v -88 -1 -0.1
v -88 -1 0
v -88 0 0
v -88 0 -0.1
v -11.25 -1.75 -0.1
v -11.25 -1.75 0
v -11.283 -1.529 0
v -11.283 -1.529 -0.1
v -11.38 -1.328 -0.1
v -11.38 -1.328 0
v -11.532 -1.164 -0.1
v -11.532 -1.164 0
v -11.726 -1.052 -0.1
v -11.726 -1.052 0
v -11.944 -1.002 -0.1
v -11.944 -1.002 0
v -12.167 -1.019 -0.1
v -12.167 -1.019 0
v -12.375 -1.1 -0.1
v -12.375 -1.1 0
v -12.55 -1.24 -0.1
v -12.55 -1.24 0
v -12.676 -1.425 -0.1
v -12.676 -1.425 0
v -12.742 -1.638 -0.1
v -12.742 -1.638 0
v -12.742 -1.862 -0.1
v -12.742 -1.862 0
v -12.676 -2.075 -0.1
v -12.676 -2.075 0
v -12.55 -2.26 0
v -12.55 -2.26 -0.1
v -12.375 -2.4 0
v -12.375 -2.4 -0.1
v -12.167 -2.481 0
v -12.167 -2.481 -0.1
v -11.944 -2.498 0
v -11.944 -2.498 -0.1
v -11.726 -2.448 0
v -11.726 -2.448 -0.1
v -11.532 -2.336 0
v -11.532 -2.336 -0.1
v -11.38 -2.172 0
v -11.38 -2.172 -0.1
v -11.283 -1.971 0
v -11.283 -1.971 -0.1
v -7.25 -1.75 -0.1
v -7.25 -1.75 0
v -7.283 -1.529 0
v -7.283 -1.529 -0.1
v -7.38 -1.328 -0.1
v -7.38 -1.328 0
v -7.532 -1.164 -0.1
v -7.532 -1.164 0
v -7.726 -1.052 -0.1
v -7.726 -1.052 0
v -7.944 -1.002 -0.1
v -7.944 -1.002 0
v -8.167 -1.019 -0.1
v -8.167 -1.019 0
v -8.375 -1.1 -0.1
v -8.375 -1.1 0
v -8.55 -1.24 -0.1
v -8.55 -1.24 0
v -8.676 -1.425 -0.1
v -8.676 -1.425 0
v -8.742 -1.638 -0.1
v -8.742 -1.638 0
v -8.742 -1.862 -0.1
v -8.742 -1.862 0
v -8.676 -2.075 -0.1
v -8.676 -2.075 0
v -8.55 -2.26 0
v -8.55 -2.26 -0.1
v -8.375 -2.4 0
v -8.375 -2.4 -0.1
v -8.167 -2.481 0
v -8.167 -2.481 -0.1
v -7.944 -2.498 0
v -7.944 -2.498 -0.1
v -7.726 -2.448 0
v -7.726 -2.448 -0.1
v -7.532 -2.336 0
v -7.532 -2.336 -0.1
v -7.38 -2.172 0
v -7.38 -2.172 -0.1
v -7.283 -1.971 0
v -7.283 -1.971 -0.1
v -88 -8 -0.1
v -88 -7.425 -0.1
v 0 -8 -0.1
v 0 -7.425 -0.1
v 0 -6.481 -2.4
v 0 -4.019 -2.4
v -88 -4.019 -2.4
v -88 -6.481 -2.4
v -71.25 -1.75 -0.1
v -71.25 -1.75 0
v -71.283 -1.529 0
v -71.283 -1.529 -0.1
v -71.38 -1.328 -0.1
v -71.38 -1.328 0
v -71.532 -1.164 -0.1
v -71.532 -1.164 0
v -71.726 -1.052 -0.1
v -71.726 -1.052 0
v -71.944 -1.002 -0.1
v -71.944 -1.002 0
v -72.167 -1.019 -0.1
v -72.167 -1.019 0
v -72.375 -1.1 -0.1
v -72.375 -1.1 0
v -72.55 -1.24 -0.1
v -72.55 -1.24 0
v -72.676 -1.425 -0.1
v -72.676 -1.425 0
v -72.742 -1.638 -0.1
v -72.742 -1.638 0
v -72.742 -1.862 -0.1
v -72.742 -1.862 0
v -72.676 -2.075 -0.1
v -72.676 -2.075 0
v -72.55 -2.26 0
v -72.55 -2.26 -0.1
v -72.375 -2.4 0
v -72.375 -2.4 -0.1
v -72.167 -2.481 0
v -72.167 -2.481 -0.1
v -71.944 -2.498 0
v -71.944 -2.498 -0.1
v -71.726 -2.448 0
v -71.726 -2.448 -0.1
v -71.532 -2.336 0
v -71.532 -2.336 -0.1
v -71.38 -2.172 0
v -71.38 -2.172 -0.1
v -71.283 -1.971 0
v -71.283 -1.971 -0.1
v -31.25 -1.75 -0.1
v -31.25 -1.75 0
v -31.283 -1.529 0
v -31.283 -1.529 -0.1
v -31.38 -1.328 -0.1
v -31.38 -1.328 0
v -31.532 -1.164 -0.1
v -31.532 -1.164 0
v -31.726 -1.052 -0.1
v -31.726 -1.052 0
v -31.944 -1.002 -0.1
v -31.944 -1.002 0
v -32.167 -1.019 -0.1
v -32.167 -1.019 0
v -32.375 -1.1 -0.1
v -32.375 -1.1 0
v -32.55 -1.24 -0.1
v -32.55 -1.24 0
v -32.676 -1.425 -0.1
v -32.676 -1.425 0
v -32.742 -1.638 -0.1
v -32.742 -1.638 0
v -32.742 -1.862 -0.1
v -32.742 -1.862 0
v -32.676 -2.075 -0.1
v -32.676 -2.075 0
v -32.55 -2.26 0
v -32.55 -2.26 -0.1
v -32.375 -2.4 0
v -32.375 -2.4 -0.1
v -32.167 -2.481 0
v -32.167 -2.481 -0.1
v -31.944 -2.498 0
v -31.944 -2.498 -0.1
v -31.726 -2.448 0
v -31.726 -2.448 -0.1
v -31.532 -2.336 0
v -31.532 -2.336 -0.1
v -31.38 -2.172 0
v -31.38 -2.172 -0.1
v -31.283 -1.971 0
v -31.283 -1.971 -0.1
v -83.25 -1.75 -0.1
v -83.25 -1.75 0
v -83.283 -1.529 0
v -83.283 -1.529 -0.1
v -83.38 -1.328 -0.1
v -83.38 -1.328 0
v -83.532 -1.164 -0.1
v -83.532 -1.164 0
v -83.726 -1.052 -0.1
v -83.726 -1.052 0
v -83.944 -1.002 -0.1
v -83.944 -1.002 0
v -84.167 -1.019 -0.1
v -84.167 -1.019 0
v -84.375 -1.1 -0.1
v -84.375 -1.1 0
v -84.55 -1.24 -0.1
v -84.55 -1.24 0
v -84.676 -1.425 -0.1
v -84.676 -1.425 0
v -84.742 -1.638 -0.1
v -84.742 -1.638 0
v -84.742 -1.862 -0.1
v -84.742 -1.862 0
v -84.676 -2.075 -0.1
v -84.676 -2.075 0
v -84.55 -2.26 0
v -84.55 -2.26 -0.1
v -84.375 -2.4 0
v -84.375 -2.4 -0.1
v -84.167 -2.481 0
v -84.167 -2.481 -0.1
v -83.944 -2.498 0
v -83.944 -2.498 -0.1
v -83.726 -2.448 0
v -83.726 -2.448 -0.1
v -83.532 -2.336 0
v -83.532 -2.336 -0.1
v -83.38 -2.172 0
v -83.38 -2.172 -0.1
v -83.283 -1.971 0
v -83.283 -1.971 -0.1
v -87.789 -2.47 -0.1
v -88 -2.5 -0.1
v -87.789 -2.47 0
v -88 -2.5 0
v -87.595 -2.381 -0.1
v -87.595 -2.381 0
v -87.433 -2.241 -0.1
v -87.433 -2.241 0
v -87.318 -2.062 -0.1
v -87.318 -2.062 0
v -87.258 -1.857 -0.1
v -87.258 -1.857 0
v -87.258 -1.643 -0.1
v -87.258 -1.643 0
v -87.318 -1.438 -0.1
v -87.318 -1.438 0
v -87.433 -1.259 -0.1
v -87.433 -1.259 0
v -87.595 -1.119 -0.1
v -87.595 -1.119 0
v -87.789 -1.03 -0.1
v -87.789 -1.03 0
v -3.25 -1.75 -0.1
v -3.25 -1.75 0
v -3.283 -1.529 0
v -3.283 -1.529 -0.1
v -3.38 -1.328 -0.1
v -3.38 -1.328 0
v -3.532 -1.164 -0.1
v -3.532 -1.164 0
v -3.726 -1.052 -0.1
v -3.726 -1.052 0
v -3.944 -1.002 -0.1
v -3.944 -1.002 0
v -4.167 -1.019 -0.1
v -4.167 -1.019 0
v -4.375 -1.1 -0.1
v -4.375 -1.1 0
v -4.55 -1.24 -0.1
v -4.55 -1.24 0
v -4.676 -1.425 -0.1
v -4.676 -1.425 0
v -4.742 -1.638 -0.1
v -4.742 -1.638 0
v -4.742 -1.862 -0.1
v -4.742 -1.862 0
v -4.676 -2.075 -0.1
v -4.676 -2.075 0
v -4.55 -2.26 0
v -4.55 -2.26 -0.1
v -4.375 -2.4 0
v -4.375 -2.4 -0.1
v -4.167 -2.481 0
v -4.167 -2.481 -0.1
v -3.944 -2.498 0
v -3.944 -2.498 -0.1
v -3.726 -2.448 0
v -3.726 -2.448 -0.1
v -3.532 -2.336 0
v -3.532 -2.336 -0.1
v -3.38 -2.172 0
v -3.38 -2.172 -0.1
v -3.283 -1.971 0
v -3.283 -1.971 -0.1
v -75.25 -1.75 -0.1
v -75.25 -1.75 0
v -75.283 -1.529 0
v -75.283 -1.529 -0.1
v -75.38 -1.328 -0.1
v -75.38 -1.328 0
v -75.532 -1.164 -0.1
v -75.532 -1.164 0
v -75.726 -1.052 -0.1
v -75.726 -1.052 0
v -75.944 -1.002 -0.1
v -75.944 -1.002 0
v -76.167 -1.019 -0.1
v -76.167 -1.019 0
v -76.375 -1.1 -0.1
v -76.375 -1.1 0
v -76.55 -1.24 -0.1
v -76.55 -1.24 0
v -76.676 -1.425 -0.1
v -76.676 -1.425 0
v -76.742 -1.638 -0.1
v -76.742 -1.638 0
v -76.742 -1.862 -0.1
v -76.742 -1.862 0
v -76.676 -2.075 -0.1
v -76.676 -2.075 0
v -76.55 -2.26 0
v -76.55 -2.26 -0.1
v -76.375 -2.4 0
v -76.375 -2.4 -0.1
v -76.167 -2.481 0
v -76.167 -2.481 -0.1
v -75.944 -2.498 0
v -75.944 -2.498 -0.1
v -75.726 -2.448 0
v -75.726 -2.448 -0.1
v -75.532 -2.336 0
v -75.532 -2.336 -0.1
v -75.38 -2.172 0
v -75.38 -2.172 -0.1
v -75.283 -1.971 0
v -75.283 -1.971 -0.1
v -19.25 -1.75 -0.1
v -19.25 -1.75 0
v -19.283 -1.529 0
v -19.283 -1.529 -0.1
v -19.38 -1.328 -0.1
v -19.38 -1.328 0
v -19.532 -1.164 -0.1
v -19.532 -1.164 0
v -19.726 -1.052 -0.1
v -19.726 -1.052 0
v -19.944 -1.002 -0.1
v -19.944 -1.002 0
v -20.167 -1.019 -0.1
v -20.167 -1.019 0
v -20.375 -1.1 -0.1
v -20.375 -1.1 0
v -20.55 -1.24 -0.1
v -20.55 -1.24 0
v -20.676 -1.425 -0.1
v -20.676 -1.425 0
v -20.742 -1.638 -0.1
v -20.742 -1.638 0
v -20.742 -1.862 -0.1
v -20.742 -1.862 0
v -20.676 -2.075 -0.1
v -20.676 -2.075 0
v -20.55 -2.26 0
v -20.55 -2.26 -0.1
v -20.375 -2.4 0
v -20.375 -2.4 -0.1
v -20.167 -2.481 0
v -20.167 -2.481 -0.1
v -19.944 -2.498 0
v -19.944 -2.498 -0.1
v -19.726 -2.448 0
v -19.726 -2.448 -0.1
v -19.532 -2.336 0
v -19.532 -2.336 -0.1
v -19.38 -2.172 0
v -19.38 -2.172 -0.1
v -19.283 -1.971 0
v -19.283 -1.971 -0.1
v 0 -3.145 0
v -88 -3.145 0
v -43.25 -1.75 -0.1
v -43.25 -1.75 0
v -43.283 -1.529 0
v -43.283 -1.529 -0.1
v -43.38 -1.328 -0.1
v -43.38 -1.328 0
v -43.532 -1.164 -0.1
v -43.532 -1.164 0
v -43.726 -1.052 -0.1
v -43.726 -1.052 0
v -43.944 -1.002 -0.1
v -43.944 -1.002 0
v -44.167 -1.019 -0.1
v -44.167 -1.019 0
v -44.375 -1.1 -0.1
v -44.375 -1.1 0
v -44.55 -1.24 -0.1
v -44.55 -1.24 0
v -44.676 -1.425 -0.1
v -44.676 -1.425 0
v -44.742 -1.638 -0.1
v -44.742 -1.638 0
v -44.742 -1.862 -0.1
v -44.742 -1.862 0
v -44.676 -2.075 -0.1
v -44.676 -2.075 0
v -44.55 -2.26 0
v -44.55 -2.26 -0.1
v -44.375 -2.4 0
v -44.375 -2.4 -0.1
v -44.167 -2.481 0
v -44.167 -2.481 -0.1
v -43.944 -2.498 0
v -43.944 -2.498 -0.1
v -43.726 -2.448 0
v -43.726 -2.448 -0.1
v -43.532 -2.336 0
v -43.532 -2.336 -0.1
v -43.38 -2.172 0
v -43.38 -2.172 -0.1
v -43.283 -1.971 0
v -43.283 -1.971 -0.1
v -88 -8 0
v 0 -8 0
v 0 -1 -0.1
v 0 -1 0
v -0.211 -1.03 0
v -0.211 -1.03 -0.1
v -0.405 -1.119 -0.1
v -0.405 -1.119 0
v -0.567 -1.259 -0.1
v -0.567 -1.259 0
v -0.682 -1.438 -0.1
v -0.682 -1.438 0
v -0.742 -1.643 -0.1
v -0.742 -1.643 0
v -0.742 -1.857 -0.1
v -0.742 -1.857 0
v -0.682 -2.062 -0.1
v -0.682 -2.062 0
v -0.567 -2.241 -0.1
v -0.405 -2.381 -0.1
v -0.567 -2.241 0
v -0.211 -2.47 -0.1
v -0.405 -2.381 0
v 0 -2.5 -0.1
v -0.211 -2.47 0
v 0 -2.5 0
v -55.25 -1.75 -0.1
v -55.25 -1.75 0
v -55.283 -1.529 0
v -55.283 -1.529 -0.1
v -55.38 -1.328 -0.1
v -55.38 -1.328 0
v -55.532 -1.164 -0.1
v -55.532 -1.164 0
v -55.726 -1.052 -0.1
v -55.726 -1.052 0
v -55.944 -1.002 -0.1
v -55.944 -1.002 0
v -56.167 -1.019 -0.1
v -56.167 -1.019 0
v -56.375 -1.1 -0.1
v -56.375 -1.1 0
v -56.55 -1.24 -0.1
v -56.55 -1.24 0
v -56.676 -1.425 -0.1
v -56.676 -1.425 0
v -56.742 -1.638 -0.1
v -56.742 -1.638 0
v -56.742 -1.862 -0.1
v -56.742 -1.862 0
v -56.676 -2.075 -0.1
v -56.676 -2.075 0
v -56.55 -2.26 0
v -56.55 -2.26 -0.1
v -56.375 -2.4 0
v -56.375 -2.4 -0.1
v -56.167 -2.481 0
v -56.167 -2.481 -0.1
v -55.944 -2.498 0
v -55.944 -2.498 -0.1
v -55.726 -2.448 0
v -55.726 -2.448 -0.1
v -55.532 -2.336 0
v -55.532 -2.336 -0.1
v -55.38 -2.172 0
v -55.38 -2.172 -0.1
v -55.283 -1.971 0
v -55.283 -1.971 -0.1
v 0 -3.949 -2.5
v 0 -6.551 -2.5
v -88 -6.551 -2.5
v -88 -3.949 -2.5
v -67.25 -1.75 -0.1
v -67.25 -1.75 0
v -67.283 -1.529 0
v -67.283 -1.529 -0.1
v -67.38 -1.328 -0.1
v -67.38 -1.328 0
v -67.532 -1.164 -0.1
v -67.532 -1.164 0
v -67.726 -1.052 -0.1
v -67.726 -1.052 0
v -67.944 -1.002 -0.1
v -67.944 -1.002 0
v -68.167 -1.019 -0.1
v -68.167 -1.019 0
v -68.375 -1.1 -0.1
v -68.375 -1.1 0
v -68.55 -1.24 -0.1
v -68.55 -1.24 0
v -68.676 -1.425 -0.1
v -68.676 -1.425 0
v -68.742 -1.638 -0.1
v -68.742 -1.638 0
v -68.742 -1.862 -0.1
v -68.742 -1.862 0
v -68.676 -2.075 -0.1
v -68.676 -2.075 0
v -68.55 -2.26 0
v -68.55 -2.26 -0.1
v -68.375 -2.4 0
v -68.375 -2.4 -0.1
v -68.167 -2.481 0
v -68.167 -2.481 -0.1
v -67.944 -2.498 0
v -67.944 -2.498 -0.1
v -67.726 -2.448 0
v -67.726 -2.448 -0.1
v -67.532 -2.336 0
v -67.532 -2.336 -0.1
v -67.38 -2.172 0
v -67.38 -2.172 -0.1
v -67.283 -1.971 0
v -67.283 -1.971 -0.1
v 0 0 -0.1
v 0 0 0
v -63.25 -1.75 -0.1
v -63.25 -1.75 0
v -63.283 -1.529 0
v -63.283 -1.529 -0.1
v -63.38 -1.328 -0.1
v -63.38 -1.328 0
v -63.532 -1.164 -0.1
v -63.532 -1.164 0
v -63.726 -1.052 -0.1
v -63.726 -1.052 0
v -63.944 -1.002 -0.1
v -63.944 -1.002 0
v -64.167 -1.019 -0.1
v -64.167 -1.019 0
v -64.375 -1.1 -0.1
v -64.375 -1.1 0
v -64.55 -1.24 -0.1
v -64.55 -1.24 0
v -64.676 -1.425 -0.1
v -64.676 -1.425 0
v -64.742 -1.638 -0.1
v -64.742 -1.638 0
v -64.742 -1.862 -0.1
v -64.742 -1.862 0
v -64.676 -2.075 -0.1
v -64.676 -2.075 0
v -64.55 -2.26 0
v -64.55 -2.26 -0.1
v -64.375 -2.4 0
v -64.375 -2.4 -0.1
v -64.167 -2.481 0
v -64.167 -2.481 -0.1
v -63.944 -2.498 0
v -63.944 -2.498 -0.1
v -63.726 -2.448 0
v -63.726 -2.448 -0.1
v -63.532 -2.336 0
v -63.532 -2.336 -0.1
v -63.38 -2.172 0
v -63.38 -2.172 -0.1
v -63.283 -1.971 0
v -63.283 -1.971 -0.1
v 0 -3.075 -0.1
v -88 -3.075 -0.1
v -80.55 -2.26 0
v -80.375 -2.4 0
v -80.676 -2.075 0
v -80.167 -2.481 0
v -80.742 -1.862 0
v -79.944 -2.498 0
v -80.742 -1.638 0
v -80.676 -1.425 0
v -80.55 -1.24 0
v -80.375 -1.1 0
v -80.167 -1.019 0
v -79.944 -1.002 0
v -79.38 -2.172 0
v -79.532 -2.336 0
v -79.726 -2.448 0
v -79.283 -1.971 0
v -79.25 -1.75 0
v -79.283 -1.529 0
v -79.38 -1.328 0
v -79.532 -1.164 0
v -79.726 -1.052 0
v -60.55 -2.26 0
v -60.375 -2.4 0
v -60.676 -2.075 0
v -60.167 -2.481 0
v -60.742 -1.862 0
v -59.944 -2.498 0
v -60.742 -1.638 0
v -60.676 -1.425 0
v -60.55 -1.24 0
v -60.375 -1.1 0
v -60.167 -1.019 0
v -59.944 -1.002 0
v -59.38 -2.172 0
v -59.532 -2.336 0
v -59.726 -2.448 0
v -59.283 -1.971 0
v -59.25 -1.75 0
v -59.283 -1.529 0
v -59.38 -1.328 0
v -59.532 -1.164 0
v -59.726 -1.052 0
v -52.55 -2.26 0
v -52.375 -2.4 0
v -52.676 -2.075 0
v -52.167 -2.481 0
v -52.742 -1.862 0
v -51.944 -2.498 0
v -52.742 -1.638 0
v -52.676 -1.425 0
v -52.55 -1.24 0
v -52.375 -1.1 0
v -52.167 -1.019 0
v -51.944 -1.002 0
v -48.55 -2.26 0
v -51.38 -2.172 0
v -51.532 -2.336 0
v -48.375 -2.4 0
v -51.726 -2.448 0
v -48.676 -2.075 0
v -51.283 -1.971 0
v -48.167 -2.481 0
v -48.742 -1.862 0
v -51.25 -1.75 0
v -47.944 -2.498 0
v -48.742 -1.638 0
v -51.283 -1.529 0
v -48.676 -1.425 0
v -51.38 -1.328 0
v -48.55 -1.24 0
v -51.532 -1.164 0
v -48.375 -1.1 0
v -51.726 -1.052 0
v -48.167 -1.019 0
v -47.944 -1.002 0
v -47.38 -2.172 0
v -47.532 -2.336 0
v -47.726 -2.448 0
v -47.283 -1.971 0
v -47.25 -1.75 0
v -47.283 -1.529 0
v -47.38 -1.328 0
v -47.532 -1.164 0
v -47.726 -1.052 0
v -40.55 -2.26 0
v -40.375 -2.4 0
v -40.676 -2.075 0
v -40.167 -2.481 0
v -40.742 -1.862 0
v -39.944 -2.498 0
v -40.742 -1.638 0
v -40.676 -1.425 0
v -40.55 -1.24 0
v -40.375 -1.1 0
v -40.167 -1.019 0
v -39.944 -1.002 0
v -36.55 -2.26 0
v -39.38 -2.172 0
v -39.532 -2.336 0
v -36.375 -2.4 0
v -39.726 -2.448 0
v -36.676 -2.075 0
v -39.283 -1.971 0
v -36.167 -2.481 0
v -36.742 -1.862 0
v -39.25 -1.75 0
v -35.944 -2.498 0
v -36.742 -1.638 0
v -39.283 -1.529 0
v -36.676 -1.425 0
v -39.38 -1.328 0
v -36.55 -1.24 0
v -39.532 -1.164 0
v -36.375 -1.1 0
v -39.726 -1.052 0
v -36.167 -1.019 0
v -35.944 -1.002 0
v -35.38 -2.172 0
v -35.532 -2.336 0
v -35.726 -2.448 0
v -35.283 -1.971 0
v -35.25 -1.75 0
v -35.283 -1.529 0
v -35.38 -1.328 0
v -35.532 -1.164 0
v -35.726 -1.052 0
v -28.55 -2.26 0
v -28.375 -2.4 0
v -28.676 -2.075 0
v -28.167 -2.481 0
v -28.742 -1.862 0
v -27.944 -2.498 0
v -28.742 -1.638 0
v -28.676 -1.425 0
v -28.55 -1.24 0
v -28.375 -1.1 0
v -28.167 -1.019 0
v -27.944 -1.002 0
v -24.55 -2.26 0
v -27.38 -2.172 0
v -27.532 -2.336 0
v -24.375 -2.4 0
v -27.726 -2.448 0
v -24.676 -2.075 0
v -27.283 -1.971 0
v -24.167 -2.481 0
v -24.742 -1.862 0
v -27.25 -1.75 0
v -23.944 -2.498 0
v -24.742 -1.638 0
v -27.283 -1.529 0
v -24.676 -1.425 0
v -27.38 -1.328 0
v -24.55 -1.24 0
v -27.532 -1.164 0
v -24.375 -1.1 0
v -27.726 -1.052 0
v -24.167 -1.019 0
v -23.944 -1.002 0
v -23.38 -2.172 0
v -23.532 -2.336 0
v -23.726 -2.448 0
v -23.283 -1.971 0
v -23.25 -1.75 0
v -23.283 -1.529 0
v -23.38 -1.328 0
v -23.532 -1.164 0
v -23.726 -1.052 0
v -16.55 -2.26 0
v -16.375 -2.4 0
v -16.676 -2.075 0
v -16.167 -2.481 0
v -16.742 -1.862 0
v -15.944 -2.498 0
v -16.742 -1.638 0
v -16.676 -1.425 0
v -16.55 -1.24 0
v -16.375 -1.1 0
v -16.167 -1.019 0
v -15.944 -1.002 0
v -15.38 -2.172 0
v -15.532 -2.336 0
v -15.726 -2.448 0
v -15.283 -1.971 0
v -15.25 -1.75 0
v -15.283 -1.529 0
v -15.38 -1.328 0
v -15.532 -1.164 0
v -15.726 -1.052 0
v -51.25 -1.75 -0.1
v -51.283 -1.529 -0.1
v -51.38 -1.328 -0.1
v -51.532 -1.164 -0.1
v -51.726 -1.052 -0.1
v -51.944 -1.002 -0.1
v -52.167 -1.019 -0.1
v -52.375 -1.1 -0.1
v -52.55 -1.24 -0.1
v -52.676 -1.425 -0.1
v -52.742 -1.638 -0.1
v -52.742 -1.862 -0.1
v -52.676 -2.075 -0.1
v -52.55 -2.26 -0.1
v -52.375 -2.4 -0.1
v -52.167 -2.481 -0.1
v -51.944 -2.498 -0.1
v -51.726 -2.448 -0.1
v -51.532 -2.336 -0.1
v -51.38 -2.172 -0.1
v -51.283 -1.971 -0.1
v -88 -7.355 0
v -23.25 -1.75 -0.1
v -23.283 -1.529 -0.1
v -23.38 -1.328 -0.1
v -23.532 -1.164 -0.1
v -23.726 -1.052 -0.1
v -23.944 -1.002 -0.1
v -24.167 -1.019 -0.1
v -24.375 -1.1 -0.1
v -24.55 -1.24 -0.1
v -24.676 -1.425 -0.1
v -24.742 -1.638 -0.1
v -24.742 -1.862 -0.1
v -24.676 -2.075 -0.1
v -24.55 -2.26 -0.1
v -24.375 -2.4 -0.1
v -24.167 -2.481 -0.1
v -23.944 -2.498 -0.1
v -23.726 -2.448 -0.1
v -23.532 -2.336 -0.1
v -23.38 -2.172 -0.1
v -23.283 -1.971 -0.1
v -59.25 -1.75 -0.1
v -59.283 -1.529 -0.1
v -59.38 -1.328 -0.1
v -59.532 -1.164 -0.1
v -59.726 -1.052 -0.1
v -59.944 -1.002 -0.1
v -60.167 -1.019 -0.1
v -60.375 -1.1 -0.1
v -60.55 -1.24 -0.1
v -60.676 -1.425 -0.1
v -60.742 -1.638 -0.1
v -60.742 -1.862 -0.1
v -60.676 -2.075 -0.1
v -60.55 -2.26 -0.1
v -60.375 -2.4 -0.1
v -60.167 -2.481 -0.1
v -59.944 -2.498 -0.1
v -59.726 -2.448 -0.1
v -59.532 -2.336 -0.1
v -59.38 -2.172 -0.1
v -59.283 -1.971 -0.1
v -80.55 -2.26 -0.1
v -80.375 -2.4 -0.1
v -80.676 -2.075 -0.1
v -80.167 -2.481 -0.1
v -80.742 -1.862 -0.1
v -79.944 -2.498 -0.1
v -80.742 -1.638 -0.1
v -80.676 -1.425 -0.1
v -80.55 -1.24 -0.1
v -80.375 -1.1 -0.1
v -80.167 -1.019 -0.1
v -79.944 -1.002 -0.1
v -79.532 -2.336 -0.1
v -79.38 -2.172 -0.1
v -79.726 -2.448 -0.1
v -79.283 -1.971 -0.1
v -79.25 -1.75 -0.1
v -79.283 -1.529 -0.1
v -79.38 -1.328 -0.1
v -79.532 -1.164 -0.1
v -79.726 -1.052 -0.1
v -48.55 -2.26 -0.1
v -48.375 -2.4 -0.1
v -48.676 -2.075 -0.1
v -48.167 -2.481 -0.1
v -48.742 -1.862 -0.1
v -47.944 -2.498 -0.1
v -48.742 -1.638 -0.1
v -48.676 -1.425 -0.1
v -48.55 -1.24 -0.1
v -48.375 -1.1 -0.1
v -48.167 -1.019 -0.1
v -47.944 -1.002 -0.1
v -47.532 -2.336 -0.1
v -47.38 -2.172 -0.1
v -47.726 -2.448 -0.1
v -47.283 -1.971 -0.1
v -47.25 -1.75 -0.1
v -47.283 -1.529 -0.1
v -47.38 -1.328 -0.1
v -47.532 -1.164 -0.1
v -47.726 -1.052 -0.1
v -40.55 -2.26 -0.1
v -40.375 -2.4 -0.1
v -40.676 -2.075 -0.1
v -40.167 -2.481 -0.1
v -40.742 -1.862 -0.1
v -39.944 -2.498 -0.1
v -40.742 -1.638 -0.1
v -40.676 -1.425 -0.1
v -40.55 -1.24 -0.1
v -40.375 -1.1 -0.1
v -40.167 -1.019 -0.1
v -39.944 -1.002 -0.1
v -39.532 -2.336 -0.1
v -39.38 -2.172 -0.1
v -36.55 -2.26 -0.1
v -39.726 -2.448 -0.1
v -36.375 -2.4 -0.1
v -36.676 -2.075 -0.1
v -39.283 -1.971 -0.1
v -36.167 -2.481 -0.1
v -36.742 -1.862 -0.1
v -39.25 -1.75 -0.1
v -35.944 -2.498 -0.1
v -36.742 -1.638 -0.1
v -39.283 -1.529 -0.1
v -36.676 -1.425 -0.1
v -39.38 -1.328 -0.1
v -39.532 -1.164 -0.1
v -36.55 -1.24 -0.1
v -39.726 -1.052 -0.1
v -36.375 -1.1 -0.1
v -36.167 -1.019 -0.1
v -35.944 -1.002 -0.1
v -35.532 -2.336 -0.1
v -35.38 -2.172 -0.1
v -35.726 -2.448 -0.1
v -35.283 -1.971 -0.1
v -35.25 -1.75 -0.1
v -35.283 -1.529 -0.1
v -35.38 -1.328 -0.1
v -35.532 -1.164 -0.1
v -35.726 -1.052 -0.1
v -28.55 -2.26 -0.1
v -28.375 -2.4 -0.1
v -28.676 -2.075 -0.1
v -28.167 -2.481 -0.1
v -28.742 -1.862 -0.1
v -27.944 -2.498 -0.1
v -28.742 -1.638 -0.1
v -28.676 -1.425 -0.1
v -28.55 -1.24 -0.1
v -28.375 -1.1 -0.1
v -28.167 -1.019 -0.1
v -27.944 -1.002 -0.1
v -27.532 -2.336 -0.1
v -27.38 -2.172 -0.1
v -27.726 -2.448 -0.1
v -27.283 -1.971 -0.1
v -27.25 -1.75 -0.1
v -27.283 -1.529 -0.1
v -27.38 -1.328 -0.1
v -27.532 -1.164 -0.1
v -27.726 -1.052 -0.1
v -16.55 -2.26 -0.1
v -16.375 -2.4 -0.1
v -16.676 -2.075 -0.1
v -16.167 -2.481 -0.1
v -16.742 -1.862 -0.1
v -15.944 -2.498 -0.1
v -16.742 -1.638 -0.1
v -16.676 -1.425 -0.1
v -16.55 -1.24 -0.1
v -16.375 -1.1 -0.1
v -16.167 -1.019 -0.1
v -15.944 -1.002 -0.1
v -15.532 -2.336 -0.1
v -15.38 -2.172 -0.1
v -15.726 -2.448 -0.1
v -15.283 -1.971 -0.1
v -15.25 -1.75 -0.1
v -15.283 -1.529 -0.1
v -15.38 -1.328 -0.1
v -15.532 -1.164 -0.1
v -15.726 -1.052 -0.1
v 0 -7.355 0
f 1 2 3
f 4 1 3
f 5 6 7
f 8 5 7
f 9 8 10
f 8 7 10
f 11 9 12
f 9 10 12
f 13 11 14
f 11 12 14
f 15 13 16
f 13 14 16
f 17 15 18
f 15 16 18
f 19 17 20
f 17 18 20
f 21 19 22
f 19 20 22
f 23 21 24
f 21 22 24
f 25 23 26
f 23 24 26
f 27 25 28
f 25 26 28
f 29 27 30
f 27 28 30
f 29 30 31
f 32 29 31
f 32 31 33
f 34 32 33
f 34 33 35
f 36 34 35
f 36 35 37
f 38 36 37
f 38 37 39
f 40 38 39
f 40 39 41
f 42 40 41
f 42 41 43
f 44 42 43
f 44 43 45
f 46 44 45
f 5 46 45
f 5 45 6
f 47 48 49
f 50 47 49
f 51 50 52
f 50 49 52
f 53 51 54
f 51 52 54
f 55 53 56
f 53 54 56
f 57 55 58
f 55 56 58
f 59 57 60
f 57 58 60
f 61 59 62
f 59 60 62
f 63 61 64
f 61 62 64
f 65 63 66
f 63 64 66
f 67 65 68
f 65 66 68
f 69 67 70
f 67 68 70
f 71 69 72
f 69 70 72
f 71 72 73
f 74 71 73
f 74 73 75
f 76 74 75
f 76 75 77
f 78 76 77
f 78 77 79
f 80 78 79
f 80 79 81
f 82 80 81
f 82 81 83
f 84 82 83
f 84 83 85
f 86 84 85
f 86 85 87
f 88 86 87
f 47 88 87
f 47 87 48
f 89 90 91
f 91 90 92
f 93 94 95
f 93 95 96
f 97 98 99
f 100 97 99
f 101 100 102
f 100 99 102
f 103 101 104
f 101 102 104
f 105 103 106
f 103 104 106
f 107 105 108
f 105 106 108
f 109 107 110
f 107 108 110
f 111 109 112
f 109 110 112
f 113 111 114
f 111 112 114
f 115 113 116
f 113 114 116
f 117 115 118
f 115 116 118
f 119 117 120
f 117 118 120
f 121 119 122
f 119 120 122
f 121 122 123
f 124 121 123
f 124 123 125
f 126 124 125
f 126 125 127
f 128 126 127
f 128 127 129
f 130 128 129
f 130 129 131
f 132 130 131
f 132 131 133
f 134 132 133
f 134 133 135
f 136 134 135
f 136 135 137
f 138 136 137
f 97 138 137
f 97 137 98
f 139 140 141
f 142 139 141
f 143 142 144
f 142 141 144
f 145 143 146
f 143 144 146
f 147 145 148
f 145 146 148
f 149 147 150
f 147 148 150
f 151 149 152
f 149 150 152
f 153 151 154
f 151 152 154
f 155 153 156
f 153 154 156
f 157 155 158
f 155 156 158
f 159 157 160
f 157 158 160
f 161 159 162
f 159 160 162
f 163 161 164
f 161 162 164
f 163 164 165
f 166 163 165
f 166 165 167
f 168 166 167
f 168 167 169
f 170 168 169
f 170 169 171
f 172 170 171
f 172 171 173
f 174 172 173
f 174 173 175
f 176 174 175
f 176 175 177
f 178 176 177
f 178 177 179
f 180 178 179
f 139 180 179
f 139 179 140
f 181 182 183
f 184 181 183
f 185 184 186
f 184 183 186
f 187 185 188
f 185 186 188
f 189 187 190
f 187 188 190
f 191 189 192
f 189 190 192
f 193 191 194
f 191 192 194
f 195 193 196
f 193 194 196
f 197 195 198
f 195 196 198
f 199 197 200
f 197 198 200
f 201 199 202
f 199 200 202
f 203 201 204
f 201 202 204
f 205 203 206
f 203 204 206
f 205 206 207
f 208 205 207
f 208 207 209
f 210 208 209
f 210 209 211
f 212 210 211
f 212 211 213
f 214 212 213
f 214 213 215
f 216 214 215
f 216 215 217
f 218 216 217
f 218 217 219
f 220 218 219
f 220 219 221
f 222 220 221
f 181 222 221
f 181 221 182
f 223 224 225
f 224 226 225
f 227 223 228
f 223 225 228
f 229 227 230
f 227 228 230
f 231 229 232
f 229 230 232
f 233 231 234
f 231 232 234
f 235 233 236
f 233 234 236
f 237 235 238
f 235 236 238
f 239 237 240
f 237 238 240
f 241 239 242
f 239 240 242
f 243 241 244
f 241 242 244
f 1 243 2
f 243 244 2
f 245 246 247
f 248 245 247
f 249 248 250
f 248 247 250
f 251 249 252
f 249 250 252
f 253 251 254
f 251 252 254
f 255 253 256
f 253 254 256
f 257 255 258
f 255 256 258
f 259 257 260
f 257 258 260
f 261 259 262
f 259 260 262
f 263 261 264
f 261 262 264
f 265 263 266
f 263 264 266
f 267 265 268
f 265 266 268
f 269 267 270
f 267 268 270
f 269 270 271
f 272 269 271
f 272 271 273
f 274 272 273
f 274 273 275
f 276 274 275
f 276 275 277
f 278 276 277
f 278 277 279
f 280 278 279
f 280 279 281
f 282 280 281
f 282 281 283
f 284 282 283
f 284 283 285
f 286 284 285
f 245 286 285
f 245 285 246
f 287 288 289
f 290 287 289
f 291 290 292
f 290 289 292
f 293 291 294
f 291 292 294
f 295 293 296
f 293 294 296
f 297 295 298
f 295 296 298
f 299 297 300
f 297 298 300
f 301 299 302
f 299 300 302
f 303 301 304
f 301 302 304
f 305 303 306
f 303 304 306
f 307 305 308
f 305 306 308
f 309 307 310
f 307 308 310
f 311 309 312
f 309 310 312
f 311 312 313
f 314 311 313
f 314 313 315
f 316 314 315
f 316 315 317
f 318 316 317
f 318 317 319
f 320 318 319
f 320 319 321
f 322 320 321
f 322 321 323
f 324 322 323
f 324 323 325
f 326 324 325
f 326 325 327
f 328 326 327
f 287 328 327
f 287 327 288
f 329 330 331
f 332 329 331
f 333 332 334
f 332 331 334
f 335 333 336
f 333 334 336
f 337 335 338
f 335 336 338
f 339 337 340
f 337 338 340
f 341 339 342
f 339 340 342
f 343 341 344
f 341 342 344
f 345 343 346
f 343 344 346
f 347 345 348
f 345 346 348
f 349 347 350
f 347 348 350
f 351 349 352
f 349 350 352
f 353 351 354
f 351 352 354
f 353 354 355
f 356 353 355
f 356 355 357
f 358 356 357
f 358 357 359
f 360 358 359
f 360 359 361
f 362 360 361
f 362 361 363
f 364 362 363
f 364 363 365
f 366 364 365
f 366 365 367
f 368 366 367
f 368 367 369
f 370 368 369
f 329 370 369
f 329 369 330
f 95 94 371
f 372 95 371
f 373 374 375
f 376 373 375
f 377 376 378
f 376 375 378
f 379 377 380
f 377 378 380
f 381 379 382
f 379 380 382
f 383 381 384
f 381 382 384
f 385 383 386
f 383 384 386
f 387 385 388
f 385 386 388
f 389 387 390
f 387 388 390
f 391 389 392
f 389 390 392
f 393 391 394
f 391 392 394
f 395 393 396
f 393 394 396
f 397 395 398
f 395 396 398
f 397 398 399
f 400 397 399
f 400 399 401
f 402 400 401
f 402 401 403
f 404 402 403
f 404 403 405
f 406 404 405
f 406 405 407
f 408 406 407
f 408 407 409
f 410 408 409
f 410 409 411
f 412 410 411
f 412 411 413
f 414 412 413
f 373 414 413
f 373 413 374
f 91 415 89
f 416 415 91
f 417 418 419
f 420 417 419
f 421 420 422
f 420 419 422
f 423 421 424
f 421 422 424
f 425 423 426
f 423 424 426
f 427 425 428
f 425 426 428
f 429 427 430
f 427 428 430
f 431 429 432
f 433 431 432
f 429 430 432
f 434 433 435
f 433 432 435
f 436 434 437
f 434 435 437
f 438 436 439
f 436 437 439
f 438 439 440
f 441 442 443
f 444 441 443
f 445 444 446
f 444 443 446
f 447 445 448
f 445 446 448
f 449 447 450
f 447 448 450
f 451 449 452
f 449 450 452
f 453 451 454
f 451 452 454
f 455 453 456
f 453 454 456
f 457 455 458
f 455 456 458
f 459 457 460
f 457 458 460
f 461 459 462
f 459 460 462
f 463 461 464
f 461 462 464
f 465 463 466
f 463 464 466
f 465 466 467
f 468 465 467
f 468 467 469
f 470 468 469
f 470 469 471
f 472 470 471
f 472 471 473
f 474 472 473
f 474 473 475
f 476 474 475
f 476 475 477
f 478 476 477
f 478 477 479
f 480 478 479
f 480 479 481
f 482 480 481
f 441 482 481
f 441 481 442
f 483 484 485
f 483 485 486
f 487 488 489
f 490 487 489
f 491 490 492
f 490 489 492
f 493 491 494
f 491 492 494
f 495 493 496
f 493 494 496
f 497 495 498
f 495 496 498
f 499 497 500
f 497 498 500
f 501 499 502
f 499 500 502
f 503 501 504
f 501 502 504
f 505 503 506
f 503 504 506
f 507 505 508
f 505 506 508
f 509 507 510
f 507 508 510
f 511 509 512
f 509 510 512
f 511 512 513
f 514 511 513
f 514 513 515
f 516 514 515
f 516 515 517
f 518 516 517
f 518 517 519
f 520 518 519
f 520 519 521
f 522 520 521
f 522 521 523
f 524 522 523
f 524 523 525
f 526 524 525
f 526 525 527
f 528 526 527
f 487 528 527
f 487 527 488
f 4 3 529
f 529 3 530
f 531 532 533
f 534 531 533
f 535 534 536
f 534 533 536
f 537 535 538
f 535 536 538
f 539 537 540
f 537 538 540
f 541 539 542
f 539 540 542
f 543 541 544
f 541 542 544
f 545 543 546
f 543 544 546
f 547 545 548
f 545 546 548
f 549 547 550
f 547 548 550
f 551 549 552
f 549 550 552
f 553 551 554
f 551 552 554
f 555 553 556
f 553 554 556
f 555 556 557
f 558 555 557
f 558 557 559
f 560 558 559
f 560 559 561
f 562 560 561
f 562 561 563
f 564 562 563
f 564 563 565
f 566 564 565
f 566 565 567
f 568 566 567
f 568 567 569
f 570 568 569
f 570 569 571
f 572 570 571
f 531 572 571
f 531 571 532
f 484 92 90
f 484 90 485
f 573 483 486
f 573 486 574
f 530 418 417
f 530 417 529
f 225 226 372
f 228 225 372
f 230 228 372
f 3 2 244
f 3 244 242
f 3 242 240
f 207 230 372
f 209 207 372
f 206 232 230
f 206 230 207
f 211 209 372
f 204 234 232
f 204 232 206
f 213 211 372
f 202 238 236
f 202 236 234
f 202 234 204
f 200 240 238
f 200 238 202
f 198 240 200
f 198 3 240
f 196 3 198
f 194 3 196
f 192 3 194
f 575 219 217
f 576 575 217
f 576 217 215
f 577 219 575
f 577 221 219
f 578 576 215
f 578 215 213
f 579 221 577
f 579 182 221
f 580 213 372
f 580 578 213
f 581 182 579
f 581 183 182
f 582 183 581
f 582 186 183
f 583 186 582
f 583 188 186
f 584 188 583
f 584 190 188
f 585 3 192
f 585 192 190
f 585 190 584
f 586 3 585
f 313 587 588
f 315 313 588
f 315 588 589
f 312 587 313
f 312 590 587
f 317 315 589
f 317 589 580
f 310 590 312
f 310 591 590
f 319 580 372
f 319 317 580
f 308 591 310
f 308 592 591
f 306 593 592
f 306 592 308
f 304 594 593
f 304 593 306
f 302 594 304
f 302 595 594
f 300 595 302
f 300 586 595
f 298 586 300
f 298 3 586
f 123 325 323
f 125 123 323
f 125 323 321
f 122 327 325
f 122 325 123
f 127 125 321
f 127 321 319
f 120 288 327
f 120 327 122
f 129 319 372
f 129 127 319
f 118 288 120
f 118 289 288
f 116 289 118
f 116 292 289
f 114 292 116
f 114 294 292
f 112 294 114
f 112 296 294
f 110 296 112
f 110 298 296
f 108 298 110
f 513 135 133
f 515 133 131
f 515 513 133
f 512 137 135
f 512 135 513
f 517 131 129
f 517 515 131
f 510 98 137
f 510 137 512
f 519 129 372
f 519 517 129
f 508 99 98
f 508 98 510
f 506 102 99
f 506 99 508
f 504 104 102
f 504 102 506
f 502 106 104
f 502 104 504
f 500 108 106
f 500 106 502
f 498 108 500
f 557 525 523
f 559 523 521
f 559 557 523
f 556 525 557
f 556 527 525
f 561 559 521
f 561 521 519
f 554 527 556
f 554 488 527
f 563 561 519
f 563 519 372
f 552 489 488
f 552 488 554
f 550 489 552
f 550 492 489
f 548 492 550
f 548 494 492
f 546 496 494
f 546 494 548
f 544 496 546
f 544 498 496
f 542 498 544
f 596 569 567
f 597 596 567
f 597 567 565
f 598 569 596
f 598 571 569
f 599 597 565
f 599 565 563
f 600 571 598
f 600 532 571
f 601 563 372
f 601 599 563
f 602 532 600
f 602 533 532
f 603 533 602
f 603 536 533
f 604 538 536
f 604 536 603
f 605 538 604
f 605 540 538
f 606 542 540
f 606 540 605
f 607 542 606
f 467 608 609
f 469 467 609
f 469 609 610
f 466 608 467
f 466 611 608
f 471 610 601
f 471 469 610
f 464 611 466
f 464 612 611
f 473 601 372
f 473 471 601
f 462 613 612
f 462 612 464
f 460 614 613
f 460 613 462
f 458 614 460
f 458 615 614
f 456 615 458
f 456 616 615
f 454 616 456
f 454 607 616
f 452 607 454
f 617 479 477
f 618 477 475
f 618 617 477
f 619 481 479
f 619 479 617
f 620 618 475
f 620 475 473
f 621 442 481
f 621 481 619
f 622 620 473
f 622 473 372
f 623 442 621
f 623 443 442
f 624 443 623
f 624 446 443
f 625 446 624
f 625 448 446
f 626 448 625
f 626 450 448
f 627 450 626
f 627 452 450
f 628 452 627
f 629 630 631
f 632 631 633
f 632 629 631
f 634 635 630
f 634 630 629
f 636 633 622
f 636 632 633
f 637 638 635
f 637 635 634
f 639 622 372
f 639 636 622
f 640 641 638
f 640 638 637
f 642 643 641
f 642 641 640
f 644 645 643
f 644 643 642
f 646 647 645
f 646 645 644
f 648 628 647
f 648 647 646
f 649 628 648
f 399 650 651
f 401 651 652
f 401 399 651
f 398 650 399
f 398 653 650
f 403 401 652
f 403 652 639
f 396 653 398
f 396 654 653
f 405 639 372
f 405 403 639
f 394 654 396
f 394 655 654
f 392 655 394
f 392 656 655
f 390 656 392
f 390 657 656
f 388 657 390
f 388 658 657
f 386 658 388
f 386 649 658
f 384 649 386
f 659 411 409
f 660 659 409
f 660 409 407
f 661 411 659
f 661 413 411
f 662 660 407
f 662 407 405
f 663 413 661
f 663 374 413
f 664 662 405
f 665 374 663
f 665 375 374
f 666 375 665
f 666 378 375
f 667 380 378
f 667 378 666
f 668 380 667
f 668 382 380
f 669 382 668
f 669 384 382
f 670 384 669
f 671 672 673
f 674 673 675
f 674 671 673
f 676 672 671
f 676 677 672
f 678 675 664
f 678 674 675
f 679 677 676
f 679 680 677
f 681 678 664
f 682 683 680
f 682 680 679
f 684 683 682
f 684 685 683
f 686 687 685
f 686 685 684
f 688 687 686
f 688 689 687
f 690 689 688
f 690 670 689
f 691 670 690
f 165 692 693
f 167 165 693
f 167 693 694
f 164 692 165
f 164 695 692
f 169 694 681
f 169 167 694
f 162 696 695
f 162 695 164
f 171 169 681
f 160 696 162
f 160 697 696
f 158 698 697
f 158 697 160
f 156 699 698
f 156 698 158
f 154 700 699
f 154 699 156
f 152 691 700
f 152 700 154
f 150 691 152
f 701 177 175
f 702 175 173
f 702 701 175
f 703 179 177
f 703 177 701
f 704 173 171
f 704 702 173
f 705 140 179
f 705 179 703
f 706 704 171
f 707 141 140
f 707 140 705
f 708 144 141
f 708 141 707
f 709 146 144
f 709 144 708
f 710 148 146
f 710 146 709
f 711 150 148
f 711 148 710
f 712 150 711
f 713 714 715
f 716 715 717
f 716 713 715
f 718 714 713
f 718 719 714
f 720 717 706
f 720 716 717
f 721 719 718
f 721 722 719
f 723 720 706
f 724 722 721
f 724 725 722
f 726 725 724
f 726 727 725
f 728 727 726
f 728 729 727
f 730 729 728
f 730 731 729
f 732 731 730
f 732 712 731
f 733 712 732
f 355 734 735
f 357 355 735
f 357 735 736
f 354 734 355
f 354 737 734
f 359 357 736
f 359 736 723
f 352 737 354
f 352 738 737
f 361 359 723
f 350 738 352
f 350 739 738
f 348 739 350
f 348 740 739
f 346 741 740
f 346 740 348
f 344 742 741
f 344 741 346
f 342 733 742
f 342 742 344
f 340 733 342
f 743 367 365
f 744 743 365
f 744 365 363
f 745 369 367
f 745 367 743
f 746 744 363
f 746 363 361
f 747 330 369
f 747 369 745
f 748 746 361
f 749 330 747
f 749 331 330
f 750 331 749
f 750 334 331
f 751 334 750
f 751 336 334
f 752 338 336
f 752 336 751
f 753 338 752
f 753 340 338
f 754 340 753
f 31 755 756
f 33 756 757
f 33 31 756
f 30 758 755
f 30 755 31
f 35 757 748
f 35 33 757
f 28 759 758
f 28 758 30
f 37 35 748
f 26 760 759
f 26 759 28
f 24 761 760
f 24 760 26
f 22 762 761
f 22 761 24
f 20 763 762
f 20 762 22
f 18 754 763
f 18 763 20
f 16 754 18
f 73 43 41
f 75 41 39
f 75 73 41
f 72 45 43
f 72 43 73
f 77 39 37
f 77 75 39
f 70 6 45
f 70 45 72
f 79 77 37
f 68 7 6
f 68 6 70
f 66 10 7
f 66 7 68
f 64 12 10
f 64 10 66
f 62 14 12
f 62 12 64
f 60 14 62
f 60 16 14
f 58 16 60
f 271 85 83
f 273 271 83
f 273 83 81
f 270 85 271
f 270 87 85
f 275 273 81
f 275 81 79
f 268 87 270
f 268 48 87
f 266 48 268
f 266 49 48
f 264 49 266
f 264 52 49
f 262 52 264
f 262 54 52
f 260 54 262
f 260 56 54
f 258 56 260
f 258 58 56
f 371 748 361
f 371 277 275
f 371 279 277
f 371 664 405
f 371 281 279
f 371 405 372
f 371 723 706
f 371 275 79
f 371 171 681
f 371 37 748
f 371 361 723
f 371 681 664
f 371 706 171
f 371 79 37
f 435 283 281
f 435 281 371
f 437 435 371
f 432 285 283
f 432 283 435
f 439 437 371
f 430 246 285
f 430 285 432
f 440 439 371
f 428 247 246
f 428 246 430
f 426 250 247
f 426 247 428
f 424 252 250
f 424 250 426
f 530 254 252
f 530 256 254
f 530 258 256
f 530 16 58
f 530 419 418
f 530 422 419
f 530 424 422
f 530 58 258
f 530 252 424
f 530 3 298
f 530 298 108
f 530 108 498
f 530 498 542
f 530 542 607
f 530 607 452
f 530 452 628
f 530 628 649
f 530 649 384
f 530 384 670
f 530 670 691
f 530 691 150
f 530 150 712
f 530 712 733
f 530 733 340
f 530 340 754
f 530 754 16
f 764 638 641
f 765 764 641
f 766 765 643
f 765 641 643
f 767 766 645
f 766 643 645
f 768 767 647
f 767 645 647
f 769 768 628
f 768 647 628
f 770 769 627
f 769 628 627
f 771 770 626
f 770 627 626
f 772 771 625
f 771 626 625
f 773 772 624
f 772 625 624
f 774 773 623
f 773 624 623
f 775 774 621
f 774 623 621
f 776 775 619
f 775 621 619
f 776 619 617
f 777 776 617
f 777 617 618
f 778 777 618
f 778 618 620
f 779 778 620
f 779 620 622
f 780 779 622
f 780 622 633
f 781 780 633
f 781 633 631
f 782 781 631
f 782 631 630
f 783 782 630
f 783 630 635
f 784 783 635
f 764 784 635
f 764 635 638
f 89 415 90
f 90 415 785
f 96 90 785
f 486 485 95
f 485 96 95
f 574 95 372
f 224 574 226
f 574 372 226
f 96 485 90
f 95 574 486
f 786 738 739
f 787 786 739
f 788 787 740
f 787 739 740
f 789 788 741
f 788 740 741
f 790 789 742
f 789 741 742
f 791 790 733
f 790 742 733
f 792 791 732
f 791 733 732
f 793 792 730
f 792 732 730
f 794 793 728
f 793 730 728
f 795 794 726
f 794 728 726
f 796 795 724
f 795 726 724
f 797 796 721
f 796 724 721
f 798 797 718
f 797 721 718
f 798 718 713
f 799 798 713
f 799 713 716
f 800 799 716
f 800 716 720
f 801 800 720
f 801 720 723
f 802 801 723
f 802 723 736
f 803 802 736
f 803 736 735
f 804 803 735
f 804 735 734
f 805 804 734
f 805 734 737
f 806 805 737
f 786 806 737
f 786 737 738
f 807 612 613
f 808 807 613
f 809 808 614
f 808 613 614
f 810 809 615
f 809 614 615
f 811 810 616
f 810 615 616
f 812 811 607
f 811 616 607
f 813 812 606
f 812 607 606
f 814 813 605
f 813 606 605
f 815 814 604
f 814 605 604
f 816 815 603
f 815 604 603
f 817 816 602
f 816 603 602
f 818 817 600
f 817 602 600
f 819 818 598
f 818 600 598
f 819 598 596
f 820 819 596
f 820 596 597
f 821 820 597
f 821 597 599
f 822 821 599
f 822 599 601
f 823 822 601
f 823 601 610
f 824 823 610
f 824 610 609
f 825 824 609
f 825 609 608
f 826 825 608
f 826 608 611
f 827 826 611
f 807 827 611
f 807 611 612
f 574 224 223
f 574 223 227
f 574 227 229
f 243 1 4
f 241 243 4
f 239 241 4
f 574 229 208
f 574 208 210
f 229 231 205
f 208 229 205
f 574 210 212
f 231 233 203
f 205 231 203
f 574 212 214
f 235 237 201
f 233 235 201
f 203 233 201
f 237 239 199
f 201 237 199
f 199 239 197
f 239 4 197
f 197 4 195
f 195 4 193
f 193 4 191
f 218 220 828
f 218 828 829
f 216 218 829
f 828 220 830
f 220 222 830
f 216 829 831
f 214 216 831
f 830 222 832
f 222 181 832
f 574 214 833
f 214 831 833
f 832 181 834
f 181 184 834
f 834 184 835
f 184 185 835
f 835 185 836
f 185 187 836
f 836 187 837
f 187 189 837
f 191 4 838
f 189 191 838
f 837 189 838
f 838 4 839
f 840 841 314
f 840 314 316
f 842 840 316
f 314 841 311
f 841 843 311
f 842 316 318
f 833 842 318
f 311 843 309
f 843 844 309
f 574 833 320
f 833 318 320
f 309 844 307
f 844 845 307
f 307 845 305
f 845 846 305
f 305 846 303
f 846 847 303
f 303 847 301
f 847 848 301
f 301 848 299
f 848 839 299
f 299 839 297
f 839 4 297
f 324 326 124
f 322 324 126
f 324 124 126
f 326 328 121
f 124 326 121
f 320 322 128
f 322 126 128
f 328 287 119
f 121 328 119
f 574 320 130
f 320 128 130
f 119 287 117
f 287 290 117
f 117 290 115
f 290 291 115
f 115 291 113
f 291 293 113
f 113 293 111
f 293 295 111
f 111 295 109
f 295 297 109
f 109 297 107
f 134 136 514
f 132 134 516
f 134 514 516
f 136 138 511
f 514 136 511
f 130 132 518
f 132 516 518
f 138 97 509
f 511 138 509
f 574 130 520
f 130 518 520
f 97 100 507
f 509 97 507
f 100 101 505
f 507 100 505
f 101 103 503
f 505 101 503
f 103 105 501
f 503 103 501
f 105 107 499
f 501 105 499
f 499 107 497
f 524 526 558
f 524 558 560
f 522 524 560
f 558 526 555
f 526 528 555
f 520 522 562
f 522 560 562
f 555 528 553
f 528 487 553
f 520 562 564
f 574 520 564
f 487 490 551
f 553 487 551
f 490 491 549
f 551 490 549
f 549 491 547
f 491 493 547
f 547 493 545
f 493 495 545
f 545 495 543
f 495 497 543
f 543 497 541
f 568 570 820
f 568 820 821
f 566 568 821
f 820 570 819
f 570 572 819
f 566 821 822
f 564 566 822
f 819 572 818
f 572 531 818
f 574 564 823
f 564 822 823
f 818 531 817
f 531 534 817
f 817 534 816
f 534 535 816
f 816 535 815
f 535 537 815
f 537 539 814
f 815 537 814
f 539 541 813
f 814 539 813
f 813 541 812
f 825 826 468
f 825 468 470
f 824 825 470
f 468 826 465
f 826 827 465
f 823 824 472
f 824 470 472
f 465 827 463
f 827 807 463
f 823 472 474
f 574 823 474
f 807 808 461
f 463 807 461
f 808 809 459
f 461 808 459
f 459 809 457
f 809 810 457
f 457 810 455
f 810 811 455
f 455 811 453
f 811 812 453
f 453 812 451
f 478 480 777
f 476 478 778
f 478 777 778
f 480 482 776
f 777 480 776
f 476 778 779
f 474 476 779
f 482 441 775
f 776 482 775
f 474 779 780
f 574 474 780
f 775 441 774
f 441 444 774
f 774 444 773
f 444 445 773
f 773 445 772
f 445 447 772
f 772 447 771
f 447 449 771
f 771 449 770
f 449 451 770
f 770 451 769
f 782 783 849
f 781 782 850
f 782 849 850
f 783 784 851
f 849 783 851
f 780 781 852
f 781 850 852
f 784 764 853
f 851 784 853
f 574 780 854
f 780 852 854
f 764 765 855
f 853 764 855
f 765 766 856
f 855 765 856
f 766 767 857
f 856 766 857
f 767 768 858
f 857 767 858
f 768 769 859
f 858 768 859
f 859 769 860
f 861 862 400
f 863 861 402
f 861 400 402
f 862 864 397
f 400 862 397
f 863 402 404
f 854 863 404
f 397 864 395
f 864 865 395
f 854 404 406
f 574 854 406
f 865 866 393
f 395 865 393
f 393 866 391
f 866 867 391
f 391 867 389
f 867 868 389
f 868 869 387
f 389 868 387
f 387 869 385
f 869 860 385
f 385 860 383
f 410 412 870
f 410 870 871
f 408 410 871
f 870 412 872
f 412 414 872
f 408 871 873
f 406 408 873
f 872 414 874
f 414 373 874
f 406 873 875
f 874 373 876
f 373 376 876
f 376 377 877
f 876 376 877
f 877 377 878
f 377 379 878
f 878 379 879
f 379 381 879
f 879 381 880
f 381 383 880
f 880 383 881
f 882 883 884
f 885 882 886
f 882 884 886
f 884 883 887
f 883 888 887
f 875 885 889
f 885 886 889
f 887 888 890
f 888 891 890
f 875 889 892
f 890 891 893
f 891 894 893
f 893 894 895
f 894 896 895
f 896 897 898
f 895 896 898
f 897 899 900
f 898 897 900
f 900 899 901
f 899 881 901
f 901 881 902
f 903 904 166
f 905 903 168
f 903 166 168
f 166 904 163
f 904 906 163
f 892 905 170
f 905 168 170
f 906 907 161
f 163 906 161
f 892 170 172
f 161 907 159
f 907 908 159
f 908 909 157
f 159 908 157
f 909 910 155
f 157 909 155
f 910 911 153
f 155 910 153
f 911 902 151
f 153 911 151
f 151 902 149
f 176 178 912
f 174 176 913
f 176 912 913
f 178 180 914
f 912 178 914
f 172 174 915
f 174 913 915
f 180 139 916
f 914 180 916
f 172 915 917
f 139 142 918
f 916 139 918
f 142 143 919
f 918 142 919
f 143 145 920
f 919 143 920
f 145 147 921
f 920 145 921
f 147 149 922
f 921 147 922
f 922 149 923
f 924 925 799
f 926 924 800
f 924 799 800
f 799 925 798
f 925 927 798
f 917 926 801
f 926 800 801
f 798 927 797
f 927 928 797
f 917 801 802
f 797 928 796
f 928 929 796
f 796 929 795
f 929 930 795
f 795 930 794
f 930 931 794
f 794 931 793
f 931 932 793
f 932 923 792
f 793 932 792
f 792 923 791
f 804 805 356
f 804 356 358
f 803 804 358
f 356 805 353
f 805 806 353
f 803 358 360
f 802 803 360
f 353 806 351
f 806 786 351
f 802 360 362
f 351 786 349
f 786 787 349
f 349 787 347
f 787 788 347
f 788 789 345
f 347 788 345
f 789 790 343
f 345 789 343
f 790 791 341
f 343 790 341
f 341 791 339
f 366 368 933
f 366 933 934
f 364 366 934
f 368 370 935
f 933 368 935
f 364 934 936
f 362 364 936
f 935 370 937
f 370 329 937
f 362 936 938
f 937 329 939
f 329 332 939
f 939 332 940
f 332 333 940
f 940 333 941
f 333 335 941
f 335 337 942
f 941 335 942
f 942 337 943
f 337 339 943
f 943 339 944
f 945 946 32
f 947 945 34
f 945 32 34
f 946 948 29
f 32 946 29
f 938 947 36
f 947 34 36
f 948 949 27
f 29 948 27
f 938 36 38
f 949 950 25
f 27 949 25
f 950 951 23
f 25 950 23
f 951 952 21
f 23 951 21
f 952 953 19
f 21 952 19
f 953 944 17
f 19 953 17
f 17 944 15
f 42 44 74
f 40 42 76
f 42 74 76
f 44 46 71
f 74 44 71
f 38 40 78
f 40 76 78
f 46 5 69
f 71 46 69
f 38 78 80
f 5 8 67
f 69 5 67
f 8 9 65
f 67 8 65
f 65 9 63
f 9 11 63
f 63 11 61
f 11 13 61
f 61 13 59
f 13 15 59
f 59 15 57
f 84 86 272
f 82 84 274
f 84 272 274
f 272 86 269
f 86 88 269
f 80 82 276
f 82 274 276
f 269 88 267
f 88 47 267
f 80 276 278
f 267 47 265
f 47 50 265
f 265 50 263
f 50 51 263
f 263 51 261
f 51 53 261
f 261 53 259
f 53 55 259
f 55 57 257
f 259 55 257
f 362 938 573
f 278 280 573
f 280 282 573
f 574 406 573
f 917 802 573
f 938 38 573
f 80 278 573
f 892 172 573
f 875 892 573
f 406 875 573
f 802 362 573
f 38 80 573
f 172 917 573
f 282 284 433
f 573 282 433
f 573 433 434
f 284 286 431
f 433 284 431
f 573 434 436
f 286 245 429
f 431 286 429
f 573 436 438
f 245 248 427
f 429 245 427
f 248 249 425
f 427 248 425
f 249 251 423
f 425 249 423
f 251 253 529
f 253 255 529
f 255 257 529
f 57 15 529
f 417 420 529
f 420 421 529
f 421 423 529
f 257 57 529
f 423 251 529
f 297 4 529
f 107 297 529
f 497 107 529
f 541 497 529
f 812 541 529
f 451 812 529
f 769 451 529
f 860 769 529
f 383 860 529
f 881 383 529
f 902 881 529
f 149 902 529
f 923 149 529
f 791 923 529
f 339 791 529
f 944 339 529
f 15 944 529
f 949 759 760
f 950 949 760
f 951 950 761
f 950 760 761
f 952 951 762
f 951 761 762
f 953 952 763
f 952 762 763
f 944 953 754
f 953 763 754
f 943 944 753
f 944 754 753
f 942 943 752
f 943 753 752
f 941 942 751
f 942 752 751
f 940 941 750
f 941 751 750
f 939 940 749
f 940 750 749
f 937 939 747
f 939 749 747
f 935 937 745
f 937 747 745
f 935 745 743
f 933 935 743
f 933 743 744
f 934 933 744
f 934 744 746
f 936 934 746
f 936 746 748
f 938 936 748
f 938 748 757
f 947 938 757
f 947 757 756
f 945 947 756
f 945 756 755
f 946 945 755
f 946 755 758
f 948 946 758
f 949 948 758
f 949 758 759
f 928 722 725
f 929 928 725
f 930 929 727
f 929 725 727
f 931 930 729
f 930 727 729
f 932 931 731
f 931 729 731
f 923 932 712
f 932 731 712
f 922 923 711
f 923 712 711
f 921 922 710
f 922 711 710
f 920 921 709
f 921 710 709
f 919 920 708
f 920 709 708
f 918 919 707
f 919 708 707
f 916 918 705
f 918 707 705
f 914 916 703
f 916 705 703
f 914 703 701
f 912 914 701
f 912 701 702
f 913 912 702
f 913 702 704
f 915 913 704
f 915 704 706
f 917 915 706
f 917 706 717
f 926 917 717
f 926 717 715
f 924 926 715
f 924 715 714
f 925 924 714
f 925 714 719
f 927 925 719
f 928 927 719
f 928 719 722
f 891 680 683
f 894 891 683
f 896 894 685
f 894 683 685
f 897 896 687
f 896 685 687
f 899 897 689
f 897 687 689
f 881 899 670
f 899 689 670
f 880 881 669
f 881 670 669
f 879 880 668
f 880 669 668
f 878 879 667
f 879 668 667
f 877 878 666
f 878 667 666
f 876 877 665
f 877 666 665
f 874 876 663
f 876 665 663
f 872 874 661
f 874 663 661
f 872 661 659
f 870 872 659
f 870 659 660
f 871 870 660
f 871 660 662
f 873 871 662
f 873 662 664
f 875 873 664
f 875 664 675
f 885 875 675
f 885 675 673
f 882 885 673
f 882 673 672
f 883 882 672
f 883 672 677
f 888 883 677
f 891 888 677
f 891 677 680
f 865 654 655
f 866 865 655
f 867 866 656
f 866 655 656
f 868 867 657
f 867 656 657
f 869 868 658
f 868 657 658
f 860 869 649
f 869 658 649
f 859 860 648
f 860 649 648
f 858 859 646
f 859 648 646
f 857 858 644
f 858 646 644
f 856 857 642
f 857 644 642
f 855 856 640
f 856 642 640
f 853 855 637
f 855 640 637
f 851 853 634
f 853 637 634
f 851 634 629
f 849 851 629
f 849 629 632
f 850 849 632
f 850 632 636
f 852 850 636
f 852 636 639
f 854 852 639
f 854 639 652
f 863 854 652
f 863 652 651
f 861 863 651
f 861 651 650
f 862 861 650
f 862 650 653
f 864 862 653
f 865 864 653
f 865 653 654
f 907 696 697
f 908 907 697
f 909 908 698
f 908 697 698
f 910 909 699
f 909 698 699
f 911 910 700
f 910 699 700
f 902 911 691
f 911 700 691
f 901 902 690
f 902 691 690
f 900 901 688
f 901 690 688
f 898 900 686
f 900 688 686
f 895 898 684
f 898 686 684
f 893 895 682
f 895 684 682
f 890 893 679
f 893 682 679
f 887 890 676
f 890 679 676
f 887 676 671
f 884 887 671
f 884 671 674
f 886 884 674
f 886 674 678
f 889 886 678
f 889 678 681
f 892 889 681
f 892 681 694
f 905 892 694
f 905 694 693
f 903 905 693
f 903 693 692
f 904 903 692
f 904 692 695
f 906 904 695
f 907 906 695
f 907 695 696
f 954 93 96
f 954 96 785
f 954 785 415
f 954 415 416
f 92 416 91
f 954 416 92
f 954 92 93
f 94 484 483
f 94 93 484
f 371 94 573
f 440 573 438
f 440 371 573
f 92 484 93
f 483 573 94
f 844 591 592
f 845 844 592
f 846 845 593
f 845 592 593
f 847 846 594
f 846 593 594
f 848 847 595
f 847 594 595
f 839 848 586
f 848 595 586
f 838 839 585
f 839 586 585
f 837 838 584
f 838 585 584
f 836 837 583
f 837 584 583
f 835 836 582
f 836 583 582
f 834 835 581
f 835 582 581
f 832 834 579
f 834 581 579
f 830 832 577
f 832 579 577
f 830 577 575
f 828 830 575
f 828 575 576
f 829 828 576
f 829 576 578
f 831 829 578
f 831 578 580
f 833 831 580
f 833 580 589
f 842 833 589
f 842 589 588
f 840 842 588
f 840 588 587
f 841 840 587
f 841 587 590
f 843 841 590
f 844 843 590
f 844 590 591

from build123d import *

# Parameters (mm, degrees)
TOP_SKETCH_W             = 88
TOP_SKETCH_H             = 8
THICKNESS_EXTRUDE_DEPTH  = 0.1
PIN_HOLE_SKETCH_R        = 0.75
FIRST_PIN_HOLE_CUT_DEPTH = 89.362944722
PIN_HOLE_PATTERN_COUNT   = 23
PIN_HOLE_PATTERN_PITCH   = 4
POCKET_CUT_OUT_DEPTH     = 89.362944722
POCKET_DEPTH             = 88


with BuildPart() as part:
    # Top Sketch → Thickness Extrude (new body)
    with BuildSketch(Plane.XY):
        with Locations((-44, -4)):
            Rectangle(TOP_SKETCH_W, TOP_SKETCH_H)
    extrude(amount=-THICKNESS_EXTRUDE_DEPTH)

    # Pin Hole Sketch → First Pin Hole Cut (cut, through all)
    with BuildSketch(Plane.XY):
        with Locations((0, -1.75)):
            Circle(PIN_HOLE_SKETCH_R)
    first_pin_hole_cut = extrude(amount=-FIRST_PIN_HOLE_CUT_DEPTH, mode=Mode.SUBTRACT)

    # Pin Hole Pattern: First Pin Hole Cut ×23
    with Locations(*[(-i * PIN_HOLE_PATTERN_PITCH, 0, 0) for i in range(1, PIN_HOLE_PATTERN_COUNT)]):
        add(first_pin_hole_cut, mode=Mode.SUBTRACT)

    # Pocket Cut Out Sketch → Pocket Cut Out (cut, through all)
    with BuildSketch(Plane(origin=(0, 0, 0), x_dir=(0, 0, -1), z_dir=(1, 0, 0))):
        Polygon((0, -3.145020754), (0, -7.354979246), (2.4, -6.481450684), (2.4, -4.018549316), align=None)
    extrude(amount=-POCKET_CUT_OUT_DEPTH, mode=Mode.SUBTRACT)


with BuildPart() as pocket_cut_out_piece_1:
    # of the separate pieces the step leaves, piece 1, a body of its own (pocket_cut_out_pieces)
    add(part.part.solids().sort_by_distance((-88, 0, 0))[0])



with BuildPart() as pocket_cut_out_piece_2:
    # of the separate pieces the step leaves, piece 2, a body of its own (pocket_cut_out_pieces)
    add(part.part.solids().sort_by_distance((0, -7.354979246, 0))[0])


with BuildPart() as pocket_cut_out_piece_1_1:
    add(pocket_cut_out_piece_1.part)

    add(pocket_cut_out_piece_2.part)  # Pocket merges Pocket Cut Out piece 2
    # Pocket Sketch → Pocket (add, through all)
    with BuildSketch(Plane(origin=(0, 0, 0), x_dir=(0, 0, -1), z_dir=(1, 0, 0))):
        Polygon((0, -3.145020754), (2.4, -4.018549316), (2.4, -6.481450684), (0, -7.354979246), (0.1, -7.425), (2.5, -6.551471438), (2.5, -3.948528562), (0.1, -3.075), align=None)
    extrude(amount=-POCKET_DEPTH)


solid = pocket_cut_out_piece_1_1.part
